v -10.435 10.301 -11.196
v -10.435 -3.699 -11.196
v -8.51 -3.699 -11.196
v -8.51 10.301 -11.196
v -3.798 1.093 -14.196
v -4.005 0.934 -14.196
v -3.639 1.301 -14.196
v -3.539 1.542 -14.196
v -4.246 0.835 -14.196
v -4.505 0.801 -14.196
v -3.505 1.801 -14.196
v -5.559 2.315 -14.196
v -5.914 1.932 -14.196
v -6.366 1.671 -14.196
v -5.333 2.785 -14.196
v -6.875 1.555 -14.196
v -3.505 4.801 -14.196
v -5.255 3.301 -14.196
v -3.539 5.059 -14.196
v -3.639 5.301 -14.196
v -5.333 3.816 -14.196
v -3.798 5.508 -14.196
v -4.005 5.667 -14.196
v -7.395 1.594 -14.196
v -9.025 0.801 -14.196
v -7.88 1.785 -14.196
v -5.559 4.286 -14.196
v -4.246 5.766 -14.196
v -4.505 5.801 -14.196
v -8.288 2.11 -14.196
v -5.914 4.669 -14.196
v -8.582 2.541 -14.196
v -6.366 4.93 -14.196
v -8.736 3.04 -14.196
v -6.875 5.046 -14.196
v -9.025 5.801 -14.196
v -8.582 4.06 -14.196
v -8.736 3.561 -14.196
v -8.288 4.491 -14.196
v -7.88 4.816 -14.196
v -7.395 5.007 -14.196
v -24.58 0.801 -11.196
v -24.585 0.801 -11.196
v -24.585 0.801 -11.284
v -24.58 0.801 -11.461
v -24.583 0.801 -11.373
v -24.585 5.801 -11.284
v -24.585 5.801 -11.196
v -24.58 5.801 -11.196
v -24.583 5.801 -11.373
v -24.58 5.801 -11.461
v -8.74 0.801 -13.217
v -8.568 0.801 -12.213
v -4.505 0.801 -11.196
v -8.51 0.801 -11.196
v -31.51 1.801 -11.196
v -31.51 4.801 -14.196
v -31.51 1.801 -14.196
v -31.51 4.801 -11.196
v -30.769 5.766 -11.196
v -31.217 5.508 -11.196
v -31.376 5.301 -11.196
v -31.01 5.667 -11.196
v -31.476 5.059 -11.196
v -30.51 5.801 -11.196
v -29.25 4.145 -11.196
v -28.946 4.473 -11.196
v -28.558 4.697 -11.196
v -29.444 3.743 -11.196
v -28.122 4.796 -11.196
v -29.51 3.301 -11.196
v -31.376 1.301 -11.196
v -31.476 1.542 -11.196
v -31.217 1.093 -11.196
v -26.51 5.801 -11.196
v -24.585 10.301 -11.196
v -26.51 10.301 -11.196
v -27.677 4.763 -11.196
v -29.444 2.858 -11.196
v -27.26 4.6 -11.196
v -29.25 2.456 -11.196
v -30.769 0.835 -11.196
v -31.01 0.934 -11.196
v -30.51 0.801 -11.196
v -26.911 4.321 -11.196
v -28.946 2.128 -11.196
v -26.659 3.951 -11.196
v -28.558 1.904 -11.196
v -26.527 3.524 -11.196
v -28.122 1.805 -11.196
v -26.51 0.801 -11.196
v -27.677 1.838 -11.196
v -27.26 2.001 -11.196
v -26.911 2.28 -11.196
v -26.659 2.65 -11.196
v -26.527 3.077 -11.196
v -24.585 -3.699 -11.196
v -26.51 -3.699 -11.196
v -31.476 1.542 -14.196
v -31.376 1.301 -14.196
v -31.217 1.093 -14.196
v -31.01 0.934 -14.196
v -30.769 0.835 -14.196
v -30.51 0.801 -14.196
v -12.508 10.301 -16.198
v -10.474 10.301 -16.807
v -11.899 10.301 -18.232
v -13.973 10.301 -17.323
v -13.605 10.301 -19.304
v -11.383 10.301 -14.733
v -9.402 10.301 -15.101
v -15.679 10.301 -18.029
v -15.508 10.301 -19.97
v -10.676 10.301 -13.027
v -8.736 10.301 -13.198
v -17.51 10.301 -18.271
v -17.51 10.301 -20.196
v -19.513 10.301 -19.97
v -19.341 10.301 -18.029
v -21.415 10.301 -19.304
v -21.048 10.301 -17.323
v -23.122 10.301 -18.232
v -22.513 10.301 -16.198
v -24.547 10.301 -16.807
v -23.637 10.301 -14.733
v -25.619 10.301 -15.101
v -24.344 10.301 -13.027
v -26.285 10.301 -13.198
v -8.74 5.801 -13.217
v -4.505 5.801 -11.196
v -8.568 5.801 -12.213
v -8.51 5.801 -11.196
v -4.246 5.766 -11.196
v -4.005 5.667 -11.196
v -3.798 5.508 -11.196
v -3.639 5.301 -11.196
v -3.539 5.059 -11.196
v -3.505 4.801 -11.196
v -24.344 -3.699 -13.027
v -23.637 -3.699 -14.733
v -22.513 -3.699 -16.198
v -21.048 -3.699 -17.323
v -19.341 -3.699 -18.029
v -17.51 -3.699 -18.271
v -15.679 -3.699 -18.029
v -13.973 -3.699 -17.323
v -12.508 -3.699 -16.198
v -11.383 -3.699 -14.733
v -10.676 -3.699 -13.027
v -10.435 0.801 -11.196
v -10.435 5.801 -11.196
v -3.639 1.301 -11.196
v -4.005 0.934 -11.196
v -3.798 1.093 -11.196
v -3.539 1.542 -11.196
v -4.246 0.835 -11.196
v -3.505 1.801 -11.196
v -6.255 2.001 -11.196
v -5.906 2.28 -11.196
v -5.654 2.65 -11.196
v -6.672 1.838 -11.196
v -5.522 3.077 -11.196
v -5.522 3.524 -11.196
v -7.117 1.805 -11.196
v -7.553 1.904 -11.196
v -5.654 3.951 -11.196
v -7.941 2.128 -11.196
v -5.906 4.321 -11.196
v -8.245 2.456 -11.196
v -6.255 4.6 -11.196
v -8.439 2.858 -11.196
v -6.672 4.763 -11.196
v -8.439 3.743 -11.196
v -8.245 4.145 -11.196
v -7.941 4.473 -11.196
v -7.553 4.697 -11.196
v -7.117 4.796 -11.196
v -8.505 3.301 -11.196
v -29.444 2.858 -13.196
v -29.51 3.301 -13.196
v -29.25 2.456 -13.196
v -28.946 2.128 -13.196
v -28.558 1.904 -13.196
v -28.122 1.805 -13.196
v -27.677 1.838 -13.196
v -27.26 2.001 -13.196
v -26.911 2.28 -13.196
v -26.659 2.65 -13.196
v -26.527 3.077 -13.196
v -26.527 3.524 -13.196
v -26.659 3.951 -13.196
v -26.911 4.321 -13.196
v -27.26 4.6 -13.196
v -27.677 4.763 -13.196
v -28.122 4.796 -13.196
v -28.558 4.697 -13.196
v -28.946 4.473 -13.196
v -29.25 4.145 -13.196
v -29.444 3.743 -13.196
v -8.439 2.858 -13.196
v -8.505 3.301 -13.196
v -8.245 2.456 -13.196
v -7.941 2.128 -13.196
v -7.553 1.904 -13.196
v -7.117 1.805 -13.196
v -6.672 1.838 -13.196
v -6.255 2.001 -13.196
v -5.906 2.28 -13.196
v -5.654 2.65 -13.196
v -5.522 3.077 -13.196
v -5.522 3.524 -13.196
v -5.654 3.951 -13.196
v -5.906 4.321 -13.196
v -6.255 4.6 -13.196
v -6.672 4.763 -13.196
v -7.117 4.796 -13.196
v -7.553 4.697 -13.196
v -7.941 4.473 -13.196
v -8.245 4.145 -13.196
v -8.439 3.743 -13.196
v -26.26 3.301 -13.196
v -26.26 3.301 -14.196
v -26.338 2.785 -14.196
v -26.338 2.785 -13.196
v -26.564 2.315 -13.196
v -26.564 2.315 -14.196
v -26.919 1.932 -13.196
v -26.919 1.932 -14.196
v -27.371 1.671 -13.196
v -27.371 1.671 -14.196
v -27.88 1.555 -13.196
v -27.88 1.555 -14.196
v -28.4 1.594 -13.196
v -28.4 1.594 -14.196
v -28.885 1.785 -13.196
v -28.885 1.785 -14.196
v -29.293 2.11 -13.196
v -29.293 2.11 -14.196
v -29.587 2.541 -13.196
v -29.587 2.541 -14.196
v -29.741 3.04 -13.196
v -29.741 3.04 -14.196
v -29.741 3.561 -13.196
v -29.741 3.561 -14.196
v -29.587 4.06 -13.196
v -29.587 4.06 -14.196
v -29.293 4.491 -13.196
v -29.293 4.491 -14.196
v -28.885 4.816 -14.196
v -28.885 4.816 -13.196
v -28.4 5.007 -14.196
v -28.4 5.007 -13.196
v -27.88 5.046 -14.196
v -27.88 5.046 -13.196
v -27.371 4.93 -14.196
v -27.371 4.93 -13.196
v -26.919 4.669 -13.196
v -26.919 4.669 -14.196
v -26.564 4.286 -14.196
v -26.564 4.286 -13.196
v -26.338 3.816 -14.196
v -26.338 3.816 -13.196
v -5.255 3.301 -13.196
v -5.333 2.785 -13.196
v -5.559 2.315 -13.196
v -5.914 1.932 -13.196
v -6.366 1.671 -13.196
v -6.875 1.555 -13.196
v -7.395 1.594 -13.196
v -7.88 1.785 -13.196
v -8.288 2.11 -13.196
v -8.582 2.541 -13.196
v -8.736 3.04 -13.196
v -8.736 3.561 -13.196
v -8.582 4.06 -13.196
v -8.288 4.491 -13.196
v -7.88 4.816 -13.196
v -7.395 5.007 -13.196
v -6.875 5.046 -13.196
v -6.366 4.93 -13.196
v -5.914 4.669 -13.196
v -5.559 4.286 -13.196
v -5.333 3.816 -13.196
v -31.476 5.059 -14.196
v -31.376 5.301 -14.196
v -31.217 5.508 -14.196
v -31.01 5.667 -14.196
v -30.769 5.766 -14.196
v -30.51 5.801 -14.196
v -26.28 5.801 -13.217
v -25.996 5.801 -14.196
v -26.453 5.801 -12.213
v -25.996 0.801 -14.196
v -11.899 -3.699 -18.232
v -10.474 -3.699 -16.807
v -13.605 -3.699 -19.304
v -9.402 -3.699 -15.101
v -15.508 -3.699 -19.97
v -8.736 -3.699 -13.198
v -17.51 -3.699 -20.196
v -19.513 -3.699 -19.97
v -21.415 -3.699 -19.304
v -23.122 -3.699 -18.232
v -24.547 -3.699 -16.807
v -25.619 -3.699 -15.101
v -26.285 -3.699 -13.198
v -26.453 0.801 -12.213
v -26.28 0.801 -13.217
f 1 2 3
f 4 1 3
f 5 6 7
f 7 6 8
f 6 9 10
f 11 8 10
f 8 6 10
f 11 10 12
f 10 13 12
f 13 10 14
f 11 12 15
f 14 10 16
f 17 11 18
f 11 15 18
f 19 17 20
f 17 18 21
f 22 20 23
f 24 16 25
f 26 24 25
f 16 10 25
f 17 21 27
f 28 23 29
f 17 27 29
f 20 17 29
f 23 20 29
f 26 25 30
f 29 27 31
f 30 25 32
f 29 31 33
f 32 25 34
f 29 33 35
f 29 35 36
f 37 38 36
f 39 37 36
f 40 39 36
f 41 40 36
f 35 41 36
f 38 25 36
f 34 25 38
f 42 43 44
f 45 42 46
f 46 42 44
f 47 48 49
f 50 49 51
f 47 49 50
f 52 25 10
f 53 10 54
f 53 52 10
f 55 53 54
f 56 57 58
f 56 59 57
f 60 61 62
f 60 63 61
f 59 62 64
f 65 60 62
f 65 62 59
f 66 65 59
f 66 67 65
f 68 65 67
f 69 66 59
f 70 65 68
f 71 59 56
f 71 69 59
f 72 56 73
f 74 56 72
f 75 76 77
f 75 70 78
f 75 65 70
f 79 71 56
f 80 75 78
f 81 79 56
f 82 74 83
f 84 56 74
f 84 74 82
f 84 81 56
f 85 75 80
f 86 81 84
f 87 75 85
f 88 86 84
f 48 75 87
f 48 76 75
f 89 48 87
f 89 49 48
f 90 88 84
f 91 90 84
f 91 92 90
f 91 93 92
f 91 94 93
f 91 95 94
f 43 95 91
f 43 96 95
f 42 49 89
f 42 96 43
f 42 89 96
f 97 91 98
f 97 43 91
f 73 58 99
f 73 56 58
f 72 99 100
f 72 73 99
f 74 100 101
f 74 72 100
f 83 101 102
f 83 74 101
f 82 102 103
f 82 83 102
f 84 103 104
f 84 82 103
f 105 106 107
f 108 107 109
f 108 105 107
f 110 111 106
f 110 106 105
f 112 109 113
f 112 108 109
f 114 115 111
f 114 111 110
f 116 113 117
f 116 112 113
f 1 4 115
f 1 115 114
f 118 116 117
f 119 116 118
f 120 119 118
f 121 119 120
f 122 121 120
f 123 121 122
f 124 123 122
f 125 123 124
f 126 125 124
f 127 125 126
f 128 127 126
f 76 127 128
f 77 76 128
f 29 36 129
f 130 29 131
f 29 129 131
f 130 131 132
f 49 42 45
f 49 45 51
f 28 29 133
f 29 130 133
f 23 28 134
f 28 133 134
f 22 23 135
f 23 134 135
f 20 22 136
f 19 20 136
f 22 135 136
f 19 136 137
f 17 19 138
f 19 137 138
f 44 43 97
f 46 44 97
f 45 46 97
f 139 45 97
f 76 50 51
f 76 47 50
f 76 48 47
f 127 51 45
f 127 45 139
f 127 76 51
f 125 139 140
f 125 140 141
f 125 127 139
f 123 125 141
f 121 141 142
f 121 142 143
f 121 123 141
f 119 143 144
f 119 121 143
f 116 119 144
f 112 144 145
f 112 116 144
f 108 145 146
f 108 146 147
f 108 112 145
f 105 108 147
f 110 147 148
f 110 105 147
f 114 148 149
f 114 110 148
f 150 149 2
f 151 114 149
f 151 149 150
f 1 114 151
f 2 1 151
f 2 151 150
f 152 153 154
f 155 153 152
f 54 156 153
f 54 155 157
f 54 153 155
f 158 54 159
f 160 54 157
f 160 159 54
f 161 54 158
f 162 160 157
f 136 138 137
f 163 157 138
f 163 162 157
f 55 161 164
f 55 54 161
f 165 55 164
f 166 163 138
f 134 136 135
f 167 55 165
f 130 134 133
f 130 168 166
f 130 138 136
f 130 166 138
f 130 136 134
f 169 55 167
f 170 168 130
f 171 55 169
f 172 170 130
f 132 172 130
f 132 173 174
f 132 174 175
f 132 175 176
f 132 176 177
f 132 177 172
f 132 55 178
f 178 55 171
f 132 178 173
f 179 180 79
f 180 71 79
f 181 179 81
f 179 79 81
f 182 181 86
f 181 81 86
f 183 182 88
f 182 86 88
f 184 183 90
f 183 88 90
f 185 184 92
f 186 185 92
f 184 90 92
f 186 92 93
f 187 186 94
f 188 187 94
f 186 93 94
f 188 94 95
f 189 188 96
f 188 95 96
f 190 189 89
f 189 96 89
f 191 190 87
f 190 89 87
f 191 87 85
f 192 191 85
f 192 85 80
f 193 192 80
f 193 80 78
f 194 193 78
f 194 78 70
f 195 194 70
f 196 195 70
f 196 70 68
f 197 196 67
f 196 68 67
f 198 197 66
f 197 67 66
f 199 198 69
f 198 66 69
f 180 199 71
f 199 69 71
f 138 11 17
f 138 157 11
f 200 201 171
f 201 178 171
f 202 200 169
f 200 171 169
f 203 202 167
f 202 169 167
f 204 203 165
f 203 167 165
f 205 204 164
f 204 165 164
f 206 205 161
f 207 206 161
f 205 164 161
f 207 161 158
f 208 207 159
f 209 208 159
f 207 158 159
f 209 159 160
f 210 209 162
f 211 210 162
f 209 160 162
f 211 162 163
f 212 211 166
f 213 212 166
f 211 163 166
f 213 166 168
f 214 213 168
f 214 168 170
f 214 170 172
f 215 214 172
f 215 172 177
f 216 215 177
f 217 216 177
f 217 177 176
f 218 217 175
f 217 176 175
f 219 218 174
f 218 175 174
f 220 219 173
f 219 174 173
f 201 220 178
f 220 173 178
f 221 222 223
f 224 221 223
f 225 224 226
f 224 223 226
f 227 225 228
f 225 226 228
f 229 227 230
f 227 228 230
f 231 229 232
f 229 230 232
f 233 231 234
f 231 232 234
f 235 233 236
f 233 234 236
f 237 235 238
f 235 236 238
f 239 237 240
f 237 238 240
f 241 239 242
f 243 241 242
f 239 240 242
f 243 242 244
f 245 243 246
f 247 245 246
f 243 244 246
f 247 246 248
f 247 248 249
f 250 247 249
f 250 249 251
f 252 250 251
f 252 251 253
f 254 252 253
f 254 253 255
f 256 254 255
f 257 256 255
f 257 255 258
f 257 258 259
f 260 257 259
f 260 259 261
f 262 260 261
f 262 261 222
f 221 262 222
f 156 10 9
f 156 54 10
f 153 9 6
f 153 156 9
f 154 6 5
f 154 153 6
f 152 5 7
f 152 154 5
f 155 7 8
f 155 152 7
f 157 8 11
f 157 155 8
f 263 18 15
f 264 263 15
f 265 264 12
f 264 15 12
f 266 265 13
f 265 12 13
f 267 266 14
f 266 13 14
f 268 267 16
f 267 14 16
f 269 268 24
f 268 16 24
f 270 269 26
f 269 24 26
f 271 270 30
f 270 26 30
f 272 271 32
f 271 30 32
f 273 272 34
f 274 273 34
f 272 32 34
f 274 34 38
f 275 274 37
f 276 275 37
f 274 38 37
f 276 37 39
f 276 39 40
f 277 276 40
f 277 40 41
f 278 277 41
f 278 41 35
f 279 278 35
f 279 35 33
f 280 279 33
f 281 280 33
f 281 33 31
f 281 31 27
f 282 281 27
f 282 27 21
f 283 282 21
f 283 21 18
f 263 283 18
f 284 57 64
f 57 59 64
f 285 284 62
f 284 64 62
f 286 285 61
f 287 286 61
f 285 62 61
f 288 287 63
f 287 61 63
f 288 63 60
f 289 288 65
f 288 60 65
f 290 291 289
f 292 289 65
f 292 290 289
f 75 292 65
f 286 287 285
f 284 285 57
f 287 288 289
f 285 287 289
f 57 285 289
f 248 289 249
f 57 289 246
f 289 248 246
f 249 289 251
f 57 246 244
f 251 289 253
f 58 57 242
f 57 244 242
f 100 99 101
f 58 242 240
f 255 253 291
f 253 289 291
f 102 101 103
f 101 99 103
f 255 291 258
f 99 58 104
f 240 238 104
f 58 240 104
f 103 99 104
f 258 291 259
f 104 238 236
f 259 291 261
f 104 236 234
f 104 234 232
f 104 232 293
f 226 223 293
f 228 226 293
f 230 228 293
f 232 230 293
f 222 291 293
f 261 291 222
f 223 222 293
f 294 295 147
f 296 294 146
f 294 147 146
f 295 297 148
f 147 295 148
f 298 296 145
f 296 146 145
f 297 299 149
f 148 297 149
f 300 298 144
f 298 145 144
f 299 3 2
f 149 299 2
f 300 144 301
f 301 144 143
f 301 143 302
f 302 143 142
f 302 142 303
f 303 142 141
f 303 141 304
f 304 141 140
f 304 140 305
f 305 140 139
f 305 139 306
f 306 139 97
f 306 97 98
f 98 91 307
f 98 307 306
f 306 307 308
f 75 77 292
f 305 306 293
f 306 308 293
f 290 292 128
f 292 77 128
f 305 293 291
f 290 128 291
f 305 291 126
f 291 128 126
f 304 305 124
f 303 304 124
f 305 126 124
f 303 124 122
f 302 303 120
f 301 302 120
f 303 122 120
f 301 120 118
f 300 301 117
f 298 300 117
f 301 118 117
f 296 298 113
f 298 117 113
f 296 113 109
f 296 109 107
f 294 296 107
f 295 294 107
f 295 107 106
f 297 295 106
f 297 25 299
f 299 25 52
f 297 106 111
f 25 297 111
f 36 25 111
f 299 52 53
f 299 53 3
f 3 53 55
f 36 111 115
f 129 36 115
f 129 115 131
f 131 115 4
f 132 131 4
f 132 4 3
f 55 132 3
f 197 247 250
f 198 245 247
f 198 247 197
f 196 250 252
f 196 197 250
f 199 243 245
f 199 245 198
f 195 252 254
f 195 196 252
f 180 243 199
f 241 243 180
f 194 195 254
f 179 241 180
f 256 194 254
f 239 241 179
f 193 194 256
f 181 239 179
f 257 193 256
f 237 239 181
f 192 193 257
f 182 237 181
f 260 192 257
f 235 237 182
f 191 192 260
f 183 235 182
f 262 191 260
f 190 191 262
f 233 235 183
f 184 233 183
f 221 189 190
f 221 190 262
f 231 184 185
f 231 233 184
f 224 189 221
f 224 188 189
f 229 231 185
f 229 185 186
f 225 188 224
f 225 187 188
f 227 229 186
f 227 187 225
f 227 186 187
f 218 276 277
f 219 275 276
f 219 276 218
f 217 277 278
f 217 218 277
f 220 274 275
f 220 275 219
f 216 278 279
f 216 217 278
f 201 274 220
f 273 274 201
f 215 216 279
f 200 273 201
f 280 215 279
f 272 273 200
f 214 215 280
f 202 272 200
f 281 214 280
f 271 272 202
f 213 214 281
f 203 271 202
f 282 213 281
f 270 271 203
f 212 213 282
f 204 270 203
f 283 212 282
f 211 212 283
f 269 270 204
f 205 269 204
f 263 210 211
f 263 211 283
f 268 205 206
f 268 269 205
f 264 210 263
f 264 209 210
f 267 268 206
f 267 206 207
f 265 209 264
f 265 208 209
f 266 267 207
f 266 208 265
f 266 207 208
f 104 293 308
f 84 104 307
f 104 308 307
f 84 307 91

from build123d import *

# Parameters (mm, degrees)
PAD037_DEPTH        = 13
PAD037_DEPTH_BACK   = 1
SKETCH058_W         = 1.93
SKETCH058_H         = 5
PAD038_DEPTH        = 3
SKETCH059_W         = 5
SKETCH059_H         = 3
PAD039_DEPTH        = 5
SKETCH060_W         = 5
SKETCH060_H         = 3
PAD040_DEPTH        = 5
HOLE005_D           = 3
HOLE005_DEPTH       = 3
HOLE005_CBORE_D     = 3.5
HOLE005_CBORE_DEPTH = 1
HOLE005_TIPS_R      = 1.5
FILLET010_R         = 1
FILLET011_R         = 1
FILLET012_R         = 1


with BuildPart() as part:
    # Sketch057 (on Face1 of CopyPad023) → Pad037 (new body, two sides)
    with BuildSketch(Plane(origin=(0, -35.363644, -2), x_dir=(1, 0, 0), z_dir=(0, -1, 0))) as pad037_sk:
        with BuildLine():
            ThreePointArc((-25.035308, -10.895555), (-17.960308, -17.970555), (-10.885308, -10.895554))
            Line((-10.885308, -10.895554), (-8.960308, -10.895554))
            ThreePointArc((-26.960308, -10.895555), (-17.960308, -19.895555), (-8.960308, -10.895554))
            Line((-26.960308, -10.895555), (-25.035308, -10.895555))
        make_face()
    extrude(amount=-PAD037_DEPTH)
    extrude(pad037_sk.sketch, amount=PAD037_DEPTH_BACK)

    # Sketch058 (on Face1 of Pad037) → Pad038 (join)
    with BuildSketch(Plane.XY.offset(-12.895555)):
        with Locations((-25.995308, -29.363644)):
            Rectangle(SKETCH058_W, SKETCH058_H)
        with Locations((-9.920308, -29.363644)):
            Rectangle(SKETCH058_W, SKETCH058_H)
    extrude(amount=-PAD038_DEPTH)

    # Sketch059 (on Face12 of Pad038) → Pad039 (join)
    with BuildSketch(Plane(origin=(-26.960308, 0, -2), x_dir=(0, -1, 0), z_dir=(-1, 0, 0))):
        with Locations((29.363644, -12.395555)):
            Rectangle(SKETCH059_W, SKETCH059_H)
    extrude(amount=PAD039_DEPTH)

    # Sketch060 (on Face13 of Pad039) → Pad040 (join)
    with BuildSketch(Plane(origin=(-8.955308, 0, -2), x_dir=(0, 1, 0), z_dir=(1, 0, 0))):
        with Locations((-29.363644, -12.395555)):
            Rectangle(SKETCH060_W, SKETCH060_H)
    extrude(amount=PAD040_DEPTH)

    # Hole005
    with Locations(Plane(origin=(0, 0, -15.895555), x_dir=(1, 0, 0), z_dir=(0, 0, -1))):
        with Locations((-7.455308, 29.363644), (-28.460308, 29.363644)):
            CounterBoreHole(HOLE005_D / 2, HOLE005_CBORE_D / 2, HOLE005_CBORE_DEPTH, depth=HOLE005_DEPTH)

    # Hole005 tips → Hole005 tip 1 section 0
    with BuildSketch(Plane(origin=(0, 0, -12.895555), x_dir=(1, 0, 0), z_dir=(0, 0, -1)), mode=Mode.PRIVATE) as hole005_tip_1_s0:
        with Locations((-7.455308, 29.363644)):
            Circle(HOLE005_TIPS_R)
    loft([hole005_tip_1_s0.sketch, Vertex(-7.455308, -29.363644, -11.994264)], mode=Mode.SUBTRACT)

    # Hole005 tips → Hole005 tip 2 section 0
    with BuildSketch(Plane(origin=(0, 0, -12.895555), x_dir=(1, 0, 0), z_dir=(0, 0, -1)), mode=Mode.PRIVATE) as hole005_tip_2_s0:
        with Locations((-28.460308, 29.363644)):
            Circle(HOLE005_TIPS_R)
    loft([hole005_tip_2_s0.sketch, Vertex(-28.460308, -29.363644, -11.994264)], mode=Mode.SUBTRACT)

    # Fillet010
    fillet010_edges = [part.edges().sort_by_distance(p)[0] for p in [
        (-31.960308, -31.863644, -14.395555),
    ]]
    fillet(fillet010_edges, radius=FILLET010_R)

    # Fillet011
    fillet011_edges = [part.edges().sort_by_distance(p)[0] for p in [
        (-31.960308, -26.863644, -14.395555),
    ]]
    fillet(fillet011_edges, radius=FILLET011_R)

    # Fillet012
    fillet012_edges = [part.edges().sort_by_distance(p)[0] for p in [
        (-3.955308, -26.863644, -14.395555),
        (-3.955308, -31.863644, -14.395555),
    ]]
    fillet(fillet012_edges, radius=FILLET012_R)


with BuildPart() as part_1:
    # Body007 placement: moved
    add(part.part.moved(Location((0.45, 32.66415, 1.7))))


solid = part_1.part
